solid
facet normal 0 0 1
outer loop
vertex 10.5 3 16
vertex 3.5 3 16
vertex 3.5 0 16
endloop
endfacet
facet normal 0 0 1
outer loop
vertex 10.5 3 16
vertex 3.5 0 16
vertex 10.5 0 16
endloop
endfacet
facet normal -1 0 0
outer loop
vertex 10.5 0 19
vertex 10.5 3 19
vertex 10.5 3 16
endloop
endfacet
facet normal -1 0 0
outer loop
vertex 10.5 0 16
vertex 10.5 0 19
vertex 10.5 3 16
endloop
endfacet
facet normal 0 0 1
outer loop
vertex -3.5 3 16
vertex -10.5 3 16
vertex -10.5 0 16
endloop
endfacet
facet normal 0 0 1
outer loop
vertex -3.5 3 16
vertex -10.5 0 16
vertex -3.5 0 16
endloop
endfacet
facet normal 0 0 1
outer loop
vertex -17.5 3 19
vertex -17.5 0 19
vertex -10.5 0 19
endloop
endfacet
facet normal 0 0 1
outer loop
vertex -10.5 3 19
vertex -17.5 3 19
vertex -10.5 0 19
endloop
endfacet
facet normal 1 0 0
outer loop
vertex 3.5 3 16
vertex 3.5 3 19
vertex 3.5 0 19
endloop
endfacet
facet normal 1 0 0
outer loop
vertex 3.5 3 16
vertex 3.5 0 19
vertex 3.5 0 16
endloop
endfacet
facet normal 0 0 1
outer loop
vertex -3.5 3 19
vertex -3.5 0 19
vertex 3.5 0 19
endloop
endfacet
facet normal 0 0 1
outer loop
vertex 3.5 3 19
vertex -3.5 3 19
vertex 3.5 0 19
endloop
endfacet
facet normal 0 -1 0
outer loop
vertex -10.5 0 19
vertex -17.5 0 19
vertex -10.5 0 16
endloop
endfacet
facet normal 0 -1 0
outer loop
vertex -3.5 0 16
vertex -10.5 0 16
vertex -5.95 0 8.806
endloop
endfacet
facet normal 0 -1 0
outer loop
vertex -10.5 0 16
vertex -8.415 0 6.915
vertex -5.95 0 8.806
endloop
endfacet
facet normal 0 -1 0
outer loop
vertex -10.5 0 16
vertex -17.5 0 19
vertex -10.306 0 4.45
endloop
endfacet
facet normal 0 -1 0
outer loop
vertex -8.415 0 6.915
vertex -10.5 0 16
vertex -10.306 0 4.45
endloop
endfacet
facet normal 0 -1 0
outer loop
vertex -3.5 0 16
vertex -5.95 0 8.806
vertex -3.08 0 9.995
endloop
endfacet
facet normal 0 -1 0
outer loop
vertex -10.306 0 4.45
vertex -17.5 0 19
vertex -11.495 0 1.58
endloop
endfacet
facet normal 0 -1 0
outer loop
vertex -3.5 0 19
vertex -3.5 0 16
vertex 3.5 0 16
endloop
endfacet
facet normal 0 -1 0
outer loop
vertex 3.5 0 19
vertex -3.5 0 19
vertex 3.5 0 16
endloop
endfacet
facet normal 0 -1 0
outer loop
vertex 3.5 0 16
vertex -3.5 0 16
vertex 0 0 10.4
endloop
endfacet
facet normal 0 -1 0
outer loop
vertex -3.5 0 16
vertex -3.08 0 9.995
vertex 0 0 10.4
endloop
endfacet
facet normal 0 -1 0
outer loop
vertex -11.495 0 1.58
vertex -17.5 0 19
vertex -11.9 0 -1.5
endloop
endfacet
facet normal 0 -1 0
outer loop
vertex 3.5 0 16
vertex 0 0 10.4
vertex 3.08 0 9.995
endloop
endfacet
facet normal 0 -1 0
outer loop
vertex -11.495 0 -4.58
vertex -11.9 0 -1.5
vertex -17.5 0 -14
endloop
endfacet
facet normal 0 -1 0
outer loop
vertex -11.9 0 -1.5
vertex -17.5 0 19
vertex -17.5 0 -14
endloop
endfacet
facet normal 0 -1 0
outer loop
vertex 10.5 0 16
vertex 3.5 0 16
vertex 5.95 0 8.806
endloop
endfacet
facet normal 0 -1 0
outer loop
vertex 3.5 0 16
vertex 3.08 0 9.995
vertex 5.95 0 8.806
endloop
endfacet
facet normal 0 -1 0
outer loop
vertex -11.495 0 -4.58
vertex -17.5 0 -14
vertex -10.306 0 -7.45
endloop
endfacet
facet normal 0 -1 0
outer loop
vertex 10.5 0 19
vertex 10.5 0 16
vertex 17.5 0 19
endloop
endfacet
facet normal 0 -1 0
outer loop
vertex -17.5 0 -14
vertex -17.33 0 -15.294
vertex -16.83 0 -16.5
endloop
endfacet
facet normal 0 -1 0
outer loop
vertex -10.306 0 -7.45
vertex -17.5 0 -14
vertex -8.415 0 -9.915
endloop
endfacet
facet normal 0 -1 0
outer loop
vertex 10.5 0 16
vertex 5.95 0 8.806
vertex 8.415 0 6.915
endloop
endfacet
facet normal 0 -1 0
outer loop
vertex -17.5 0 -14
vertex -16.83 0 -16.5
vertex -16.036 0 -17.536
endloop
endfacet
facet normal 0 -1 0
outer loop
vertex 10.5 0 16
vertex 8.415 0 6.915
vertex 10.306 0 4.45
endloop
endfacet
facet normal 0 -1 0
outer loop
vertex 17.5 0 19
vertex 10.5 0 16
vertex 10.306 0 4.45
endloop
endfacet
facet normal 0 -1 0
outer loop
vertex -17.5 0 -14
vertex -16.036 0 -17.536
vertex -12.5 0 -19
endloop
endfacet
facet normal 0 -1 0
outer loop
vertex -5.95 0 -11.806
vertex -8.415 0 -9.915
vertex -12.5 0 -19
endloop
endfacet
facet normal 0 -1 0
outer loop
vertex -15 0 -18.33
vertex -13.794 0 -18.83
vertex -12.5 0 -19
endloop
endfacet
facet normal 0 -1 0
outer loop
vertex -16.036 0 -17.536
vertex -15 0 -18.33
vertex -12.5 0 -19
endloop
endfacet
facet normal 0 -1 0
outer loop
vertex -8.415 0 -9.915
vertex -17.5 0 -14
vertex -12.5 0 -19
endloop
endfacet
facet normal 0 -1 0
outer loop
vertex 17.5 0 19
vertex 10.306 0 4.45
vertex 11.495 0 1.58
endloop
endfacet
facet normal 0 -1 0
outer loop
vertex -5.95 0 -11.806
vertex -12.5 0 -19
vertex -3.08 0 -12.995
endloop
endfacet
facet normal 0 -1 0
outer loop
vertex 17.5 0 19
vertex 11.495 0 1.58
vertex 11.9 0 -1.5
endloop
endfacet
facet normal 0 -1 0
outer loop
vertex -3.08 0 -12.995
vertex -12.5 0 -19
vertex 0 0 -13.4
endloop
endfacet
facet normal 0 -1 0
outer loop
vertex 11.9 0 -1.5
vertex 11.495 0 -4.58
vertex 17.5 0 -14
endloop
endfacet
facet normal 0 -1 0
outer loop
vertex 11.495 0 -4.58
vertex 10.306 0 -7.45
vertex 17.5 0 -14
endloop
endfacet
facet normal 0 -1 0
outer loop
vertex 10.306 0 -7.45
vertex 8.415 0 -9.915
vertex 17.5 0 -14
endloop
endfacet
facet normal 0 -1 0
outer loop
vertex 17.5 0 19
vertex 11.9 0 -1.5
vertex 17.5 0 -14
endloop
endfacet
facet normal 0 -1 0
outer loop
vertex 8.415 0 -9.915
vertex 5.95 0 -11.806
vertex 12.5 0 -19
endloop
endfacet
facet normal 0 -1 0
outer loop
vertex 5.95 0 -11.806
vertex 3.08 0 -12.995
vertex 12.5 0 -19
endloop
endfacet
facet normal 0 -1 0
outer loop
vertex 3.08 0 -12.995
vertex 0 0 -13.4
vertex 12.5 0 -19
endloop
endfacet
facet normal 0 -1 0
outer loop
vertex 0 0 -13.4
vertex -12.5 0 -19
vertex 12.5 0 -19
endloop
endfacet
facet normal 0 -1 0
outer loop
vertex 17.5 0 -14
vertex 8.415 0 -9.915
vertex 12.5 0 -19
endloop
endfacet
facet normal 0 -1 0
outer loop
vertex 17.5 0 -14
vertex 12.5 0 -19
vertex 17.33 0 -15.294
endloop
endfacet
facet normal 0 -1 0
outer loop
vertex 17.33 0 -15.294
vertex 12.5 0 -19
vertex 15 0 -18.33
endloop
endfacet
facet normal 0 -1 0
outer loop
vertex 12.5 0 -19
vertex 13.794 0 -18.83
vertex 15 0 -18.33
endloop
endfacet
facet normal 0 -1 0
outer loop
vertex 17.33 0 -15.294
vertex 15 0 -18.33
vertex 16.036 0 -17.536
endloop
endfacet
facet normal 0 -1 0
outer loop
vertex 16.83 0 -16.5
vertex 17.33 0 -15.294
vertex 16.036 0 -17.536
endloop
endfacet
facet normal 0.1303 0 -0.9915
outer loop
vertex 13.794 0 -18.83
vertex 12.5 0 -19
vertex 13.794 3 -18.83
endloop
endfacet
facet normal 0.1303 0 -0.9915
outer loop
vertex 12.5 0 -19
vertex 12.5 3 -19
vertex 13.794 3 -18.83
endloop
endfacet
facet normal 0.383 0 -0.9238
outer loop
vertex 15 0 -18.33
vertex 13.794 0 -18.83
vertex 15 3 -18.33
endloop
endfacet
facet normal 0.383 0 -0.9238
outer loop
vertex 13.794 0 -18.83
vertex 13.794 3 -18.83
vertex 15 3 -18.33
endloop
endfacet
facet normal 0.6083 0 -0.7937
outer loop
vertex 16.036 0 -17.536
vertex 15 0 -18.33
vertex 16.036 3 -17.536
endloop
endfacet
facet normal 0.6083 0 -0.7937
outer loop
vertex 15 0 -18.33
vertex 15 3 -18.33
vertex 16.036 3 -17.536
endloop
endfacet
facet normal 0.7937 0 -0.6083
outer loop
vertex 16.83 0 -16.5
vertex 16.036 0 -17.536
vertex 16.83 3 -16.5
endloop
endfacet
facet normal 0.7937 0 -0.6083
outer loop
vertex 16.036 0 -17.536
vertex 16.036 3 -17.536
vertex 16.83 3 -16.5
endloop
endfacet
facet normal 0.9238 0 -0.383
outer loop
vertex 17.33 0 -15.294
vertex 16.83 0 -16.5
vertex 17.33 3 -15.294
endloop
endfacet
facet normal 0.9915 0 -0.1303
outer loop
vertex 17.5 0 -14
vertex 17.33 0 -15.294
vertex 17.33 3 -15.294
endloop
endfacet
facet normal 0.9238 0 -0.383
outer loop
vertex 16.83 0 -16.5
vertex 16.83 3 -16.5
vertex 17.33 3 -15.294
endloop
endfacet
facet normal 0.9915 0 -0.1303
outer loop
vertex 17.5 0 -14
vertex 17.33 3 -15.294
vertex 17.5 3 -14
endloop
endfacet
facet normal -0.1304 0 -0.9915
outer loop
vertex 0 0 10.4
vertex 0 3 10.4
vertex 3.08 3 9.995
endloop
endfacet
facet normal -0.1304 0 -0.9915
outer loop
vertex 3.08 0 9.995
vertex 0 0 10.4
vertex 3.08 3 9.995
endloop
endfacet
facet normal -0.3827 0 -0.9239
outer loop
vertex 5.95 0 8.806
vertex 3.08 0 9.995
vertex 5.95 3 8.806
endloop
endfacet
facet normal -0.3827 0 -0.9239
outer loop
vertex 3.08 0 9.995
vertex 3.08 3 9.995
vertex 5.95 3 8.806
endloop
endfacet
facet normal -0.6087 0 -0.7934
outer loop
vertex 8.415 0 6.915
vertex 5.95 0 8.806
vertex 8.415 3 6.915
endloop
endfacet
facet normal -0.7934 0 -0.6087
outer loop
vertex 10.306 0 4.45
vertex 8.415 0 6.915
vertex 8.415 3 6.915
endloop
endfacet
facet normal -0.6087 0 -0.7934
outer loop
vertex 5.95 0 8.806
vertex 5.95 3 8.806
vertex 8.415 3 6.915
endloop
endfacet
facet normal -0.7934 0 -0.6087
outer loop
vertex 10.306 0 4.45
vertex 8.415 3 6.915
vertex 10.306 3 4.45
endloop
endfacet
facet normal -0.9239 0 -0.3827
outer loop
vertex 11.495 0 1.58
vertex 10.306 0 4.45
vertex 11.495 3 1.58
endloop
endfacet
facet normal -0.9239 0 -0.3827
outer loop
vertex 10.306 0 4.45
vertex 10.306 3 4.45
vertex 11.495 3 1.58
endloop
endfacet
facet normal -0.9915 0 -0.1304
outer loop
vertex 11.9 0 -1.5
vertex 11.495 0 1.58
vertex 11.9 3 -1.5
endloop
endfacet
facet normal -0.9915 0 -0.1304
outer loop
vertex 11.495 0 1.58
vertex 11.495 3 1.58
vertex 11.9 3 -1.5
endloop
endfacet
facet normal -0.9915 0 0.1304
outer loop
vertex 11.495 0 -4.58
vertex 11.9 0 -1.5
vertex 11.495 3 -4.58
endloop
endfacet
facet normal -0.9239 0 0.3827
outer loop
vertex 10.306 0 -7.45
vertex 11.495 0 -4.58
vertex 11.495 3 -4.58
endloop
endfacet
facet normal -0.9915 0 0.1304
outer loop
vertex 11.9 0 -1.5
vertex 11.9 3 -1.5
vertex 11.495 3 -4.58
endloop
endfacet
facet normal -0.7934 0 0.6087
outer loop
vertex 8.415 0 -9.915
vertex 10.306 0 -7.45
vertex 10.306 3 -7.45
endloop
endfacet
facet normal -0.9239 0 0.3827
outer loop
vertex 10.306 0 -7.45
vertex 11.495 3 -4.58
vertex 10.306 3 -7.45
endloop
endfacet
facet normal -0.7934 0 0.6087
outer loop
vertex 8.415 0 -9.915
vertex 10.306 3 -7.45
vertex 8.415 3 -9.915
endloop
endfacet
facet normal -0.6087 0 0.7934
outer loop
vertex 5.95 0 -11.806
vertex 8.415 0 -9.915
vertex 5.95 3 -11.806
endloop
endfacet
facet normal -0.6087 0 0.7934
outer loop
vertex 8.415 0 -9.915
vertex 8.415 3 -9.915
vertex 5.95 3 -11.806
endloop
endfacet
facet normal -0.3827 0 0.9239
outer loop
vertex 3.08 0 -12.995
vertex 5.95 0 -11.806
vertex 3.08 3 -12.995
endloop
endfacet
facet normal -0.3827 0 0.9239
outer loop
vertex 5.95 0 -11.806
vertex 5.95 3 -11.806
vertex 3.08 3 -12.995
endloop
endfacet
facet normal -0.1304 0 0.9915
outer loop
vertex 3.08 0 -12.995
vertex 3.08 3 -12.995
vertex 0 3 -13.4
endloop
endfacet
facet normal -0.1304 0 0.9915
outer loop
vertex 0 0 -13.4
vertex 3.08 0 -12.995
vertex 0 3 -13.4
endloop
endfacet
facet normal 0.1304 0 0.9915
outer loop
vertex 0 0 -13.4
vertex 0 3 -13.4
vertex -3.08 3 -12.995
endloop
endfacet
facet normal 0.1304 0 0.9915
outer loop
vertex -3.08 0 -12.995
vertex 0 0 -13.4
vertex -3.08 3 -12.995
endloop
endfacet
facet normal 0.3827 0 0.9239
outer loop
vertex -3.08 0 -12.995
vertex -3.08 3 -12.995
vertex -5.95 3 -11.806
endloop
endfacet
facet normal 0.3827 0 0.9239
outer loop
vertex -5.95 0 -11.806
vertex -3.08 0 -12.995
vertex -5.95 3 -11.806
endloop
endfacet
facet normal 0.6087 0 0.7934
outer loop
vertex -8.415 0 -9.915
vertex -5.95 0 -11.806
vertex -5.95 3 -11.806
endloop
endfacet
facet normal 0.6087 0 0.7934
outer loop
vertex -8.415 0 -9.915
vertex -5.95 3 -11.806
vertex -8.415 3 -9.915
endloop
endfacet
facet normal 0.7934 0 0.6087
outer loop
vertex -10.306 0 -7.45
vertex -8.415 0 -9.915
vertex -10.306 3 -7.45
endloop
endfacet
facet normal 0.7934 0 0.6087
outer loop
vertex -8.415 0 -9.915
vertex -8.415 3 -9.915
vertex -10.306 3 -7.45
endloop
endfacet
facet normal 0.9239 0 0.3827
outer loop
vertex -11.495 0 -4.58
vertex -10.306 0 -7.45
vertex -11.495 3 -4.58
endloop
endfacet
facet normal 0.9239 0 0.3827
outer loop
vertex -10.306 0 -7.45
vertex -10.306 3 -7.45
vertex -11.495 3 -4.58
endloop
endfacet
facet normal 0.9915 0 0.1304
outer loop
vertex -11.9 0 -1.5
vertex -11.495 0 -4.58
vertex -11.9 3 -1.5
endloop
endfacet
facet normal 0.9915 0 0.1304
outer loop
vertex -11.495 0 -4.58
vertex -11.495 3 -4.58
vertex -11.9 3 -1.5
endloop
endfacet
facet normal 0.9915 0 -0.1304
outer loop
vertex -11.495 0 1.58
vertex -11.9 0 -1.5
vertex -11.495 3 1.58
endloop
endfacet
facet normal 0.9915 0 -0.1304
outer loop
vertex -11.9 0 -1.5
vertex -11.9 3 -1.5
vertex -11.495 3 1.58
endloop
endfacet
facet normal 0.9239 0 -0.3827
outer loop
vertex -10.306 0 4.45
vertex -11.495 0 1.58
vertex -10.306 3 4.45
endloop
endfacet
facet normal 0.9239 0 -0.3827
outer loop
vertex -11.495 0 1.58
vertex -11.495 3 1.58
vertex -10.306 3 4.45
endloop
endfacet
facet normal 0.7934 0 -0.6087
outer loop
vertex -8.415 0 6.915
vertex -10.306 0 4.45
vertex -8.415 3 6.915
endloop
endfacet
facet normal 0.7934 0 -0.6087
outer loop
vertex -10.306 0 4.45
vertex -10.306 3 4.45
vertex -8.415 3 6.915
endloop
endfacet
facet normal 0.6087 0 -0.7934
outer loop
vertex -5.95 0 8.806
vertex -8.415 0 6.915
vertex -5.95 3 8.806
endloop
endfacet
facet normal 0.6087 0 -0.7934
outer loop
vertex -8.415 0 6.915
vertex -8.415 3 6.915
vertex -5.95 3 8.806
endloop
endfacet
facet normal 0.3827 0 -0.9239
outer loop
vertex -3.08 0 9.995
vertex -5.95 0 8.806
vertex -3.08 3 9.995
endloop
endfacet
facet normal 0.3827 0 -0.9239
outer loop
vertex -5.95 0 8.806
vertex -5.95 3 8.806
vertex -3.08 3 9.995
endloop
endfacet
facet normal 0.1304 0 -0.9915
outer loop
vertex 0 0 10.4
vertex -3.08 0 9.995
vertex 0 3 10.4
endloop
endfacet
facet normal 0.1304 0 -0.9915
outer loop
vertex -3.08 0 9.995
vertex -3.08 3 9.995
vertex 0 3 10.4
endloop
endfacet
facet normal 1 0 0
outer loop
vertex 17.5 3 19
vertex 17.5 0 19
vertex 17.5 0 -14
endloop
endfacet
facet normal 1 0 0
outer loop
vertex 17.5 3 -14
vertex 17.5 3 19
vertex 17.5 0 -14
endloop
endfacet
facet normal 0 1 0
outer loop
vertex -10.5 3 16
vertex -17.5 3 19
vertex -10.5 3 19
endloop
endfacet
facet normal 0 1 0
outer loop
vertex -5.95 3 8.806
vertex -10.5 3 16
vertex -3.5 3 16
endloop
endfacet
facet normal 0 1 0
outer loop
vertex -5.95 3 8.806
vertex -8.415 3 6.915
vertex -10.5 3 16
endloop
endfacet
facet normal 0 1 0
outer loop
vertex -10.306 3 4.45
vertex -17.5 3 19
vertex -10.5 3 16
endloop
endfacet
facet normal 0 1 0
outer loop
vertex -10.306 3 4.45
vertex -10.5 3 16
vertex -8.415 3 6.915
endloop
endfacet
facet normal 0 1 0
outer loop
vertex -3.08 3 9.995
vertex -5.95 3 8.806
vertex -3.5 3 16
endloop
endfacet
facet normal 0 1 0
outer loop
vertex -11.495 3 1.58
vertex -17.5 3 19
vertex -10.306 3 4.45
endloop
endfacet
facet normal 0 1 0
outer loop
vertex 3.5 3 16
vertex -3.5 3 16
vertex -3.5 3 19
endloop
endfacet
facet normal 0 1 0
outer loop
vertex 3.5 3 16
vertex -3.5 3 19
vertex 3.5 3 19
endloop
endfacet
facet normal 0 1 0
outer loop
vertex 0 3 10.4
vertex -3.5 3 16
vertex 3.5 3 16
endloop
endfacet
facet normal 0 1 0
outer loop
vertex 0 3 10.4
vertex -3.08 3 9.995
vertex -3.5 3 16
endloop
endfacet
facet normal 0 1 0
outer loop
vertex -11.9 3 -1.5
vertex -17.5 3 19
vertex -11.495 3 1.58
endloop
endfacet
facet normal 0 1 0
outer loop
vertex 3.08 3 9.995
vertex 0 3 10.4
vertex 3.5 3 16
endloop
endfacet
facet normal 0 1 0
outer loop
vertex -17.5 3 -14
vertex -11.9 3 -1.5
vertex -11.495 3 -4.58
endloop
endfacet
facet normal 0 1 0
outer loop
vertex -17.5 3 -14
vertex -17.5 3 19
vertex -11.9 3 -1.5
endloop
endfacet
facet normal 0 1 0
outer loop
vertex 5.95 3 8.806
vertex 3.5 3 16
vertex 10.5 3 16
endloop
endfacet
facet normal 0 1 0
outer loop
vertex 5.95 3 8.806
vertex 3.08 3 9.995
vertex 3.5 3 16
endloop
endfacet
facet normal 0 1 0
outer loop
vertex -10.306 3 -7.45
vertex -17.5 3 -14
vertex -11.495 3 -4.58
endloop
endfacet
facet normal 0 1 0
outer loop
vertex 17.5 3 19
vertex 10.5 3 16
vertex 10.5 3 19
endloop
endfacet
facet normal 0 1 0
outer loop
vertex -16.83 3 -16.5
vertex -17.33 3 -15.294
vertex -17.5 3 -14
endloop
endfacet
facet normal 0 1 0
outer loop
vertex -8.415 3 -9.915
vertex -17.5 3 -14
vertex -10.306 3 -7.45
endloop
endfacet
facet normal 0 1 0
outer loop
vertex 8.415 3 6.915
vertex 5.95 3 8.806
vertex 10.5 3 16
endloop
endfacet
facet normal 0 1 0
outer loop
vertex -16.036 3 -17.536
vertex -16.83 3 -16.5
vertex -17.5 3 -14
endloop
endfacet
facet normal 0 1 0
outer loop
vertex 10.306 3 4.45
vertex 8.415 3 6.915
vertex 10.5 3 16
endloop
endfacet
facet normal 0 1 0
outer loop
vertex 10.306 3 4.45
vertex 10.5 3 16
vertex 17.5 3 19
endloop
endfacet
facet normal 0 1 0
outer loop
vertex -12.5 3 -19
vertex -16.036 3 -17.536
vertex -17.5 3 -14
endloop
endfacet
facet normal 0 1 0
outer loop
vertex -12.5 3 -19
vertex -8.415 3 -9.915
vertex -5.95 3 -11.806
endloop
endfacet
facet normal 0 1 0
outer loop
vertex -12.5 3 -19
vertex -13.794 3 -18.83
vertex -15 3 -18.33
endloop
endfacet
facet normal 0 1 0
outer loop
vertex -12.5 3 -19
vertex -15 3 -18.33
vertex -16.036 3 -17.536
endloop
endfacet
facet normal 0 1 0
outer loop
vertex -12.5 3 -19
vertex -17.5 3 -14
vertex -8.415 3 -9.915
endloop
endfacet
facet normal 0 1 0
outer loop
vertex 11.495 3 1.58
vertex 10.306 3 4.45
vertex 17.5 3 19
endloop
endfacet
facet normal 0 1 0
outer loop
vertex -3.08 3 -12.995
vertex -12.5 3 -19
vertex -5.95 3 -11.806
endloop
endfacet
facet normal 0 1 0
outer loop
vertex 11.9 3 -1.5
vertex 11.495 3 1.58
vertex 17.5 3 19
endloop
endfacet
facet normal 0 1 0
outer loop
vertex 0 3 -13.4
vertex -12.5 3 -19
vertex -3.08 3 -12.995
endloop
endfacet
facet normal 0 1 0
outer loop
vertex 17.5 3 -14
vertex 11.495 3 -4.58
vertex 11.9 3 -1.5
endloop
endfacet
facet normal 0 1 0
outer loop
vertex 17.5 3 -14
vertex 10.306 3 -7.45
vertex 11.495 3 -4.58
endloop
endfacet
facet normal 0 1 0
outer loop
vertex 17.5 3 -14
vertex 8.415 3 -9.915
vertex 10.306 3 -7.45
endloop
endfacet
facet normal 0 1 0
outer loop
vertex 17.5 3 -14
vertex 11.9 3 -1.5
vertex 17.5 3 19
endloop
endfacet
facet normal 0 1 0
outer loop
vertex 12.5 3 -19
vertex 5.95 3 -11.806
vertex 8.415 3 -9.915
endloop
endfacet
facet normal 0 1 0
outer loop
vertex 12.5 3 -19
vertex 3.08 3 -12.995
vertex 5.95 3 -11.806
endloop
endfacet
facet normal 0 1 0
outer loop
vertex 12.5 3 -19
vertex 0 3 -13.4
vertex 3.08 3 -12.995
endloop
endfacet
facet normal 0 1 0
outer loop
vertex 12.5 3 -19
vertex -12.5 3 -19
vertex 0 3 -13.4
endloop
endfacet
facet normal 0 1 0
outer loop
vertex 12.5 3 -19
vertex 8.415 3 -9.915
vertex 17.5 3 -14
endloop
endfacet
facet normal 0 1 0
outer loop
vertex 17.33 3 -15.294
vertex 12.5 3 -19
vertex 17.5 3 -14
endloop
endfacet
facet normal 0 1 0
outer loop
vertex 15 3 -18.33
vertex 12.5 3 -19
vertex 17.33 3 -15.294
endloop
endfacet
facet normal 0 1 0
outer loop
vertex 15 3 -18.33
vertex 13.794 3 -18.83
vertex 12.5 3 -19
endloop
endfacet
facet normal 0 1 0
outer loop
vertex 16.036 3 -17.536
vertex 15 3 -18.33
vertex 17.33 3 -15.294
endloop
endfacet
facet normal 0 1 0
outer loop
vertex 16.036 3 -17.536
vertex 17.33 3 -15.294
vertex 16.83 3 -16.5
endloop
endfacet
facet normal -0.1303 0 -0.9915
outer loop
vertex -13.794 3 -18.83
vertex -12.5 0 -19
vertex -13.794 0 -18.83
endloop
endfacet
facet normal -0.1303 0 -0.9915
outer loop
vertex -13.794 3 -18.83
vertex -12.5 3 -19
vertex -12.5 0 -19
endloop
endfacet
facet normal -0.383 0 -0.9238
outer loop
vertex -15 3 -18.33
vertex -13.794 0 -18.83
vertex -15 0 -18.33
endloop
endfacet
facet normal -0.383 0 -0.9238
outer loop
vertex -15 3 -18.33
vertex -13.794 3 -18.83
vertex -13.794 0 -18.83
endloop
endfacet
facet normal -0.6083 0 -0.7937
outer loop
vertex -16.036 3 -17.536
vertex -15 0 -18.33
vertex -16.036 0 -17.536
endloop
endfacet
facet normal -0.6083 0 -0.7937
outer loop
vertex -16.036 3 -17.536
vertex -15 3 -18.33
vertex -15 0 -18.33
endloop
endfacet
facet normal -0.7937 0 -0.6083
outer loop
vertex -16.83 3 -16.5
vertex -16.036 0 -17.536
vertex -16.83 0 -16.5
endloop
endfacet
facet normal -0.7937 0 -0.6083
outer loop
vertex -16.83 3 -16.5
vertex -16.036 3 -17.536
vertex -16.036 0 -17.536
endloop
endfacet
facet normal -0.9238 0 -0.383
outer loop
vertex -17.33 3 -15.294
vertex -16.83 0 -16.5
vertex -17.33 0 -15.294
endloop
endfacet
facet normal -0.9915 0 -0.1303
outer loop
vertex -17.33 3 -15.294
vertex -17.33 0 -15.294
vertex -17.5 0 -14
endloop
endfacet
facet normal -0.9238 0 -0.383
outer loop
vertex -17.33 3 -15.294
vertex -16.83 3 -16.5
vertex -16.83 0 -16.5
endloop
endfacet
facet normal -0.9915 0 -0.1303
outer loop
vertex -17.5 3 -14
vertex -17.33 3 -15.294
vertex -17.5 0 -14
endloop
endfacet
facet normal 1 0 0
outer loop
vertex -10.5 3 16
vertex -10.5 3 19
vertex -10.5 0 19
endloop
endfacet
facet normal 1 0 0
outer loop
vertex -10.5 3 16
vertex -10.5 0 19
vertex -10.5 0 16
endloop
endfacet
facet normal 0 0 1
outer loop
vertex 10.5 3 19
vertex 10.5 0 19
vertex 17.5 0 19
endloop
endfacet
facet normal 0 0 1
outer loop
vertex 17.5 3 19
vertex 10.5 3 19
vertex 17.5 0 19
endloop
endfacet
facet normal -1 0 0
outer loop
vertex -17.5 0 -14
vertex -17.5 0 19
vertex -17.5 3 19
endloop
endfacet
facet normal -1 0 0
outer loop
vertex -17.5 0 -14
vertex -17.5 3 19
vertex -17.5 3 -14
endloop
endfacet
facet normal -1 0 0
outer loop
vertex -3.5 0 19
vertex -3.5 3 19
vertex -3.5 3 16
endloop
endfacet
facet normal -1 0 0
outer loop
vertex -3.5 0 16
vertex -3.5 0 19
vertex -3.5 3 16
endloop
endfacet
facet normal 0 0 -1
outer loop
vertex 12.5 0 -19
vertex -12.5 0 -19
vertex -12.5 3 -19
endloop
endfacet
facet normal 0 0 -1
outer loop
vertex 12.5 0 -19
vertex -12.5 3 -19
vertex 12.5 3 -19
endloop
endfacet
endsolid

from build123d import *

# Parameters (mm, degrees)
SKETCH2_W           = 35
SKETCH2_H           = 38
BOSS_EXTRUDE1_DEPTH = 3
SKETCH3_R           = 11.9
CUT_EXTRUDE1_DEPTH  = 3
FILLET1_R           = 5
FILLET2_R           = 5
SKETCH4_W           = 7
SKETCH4_H           = 3
CUT_EXTRUDE2_DEPTH  = 3
LPATTERN1_COUNT     = 2
LPATTERN1_PITCH     = 14


with BuildPart() as part:
    # Sketch2 → Boss-Extrude1 (new body)
    with BuildSketch(Plane(origin=(0, 0, 0), x_dir=(1, 0, 0), z_dir=(0, 1, 0))):
        Rectangle(SKETCH2_W, SKETCH2_H)
    extrude(amount=BOSS_EXTRUDE1_DEPTH)

    # Sketch3 → Cut-Extrude1 (cut)
    with BuildSketch(Plane(origin=(0, 3, 0), x_dir=(1, 0, 0), z_dir=(0, 1, 0))):
        with Locations(Location((0, 1.5, 0), (0, 0, 270))):
            Circle(SKETCH3_R)
    extrude(amount=-CUT_EXTRUDE1_DEPTH, mode=Mode.SUBTRACT)

    # Fillet1
    fillet1_edges = [part.edges().sort_by_distance(p)[0] for p in [
        (17.5, 1.5, -19),
    ]]
    fillet(fillet1_edges, radius=FILLET1_R)

    # Fillet2
    fillet2_edges = [part.edges().sort_by_distance(p)[0] for p in [
        (-17.5, 1.5, -19),
    ]]
    fillet(fillet2_edges, radius=FILLET2_R)

    # Sketch4 → Cut-Extrude2 (cut)
    with BuildSketch(Plane(origin=(0, 3, 0), x_dir=(1, 0, 0), z_dir=(0, 1, 0))):
        with Locations((-7, -17.5)):
            Rectangle(SKETCH4_W, SKETCH4_H)
    cut_extrude2 = extrude(amount=-CUT_EXTRUDE2_DEPTH, mode=Mode.SUBTRACT)

    # LPattern1: Cut-Extrude2 ×2
    with Locations(*[(i * LPATTERN1_PITCH, 0, 0) for i in range(1, LPATTERN1_COUNT)]):
        add(cut_extrude2, mode=Mode.SUBTRACT)


solid = part.part
